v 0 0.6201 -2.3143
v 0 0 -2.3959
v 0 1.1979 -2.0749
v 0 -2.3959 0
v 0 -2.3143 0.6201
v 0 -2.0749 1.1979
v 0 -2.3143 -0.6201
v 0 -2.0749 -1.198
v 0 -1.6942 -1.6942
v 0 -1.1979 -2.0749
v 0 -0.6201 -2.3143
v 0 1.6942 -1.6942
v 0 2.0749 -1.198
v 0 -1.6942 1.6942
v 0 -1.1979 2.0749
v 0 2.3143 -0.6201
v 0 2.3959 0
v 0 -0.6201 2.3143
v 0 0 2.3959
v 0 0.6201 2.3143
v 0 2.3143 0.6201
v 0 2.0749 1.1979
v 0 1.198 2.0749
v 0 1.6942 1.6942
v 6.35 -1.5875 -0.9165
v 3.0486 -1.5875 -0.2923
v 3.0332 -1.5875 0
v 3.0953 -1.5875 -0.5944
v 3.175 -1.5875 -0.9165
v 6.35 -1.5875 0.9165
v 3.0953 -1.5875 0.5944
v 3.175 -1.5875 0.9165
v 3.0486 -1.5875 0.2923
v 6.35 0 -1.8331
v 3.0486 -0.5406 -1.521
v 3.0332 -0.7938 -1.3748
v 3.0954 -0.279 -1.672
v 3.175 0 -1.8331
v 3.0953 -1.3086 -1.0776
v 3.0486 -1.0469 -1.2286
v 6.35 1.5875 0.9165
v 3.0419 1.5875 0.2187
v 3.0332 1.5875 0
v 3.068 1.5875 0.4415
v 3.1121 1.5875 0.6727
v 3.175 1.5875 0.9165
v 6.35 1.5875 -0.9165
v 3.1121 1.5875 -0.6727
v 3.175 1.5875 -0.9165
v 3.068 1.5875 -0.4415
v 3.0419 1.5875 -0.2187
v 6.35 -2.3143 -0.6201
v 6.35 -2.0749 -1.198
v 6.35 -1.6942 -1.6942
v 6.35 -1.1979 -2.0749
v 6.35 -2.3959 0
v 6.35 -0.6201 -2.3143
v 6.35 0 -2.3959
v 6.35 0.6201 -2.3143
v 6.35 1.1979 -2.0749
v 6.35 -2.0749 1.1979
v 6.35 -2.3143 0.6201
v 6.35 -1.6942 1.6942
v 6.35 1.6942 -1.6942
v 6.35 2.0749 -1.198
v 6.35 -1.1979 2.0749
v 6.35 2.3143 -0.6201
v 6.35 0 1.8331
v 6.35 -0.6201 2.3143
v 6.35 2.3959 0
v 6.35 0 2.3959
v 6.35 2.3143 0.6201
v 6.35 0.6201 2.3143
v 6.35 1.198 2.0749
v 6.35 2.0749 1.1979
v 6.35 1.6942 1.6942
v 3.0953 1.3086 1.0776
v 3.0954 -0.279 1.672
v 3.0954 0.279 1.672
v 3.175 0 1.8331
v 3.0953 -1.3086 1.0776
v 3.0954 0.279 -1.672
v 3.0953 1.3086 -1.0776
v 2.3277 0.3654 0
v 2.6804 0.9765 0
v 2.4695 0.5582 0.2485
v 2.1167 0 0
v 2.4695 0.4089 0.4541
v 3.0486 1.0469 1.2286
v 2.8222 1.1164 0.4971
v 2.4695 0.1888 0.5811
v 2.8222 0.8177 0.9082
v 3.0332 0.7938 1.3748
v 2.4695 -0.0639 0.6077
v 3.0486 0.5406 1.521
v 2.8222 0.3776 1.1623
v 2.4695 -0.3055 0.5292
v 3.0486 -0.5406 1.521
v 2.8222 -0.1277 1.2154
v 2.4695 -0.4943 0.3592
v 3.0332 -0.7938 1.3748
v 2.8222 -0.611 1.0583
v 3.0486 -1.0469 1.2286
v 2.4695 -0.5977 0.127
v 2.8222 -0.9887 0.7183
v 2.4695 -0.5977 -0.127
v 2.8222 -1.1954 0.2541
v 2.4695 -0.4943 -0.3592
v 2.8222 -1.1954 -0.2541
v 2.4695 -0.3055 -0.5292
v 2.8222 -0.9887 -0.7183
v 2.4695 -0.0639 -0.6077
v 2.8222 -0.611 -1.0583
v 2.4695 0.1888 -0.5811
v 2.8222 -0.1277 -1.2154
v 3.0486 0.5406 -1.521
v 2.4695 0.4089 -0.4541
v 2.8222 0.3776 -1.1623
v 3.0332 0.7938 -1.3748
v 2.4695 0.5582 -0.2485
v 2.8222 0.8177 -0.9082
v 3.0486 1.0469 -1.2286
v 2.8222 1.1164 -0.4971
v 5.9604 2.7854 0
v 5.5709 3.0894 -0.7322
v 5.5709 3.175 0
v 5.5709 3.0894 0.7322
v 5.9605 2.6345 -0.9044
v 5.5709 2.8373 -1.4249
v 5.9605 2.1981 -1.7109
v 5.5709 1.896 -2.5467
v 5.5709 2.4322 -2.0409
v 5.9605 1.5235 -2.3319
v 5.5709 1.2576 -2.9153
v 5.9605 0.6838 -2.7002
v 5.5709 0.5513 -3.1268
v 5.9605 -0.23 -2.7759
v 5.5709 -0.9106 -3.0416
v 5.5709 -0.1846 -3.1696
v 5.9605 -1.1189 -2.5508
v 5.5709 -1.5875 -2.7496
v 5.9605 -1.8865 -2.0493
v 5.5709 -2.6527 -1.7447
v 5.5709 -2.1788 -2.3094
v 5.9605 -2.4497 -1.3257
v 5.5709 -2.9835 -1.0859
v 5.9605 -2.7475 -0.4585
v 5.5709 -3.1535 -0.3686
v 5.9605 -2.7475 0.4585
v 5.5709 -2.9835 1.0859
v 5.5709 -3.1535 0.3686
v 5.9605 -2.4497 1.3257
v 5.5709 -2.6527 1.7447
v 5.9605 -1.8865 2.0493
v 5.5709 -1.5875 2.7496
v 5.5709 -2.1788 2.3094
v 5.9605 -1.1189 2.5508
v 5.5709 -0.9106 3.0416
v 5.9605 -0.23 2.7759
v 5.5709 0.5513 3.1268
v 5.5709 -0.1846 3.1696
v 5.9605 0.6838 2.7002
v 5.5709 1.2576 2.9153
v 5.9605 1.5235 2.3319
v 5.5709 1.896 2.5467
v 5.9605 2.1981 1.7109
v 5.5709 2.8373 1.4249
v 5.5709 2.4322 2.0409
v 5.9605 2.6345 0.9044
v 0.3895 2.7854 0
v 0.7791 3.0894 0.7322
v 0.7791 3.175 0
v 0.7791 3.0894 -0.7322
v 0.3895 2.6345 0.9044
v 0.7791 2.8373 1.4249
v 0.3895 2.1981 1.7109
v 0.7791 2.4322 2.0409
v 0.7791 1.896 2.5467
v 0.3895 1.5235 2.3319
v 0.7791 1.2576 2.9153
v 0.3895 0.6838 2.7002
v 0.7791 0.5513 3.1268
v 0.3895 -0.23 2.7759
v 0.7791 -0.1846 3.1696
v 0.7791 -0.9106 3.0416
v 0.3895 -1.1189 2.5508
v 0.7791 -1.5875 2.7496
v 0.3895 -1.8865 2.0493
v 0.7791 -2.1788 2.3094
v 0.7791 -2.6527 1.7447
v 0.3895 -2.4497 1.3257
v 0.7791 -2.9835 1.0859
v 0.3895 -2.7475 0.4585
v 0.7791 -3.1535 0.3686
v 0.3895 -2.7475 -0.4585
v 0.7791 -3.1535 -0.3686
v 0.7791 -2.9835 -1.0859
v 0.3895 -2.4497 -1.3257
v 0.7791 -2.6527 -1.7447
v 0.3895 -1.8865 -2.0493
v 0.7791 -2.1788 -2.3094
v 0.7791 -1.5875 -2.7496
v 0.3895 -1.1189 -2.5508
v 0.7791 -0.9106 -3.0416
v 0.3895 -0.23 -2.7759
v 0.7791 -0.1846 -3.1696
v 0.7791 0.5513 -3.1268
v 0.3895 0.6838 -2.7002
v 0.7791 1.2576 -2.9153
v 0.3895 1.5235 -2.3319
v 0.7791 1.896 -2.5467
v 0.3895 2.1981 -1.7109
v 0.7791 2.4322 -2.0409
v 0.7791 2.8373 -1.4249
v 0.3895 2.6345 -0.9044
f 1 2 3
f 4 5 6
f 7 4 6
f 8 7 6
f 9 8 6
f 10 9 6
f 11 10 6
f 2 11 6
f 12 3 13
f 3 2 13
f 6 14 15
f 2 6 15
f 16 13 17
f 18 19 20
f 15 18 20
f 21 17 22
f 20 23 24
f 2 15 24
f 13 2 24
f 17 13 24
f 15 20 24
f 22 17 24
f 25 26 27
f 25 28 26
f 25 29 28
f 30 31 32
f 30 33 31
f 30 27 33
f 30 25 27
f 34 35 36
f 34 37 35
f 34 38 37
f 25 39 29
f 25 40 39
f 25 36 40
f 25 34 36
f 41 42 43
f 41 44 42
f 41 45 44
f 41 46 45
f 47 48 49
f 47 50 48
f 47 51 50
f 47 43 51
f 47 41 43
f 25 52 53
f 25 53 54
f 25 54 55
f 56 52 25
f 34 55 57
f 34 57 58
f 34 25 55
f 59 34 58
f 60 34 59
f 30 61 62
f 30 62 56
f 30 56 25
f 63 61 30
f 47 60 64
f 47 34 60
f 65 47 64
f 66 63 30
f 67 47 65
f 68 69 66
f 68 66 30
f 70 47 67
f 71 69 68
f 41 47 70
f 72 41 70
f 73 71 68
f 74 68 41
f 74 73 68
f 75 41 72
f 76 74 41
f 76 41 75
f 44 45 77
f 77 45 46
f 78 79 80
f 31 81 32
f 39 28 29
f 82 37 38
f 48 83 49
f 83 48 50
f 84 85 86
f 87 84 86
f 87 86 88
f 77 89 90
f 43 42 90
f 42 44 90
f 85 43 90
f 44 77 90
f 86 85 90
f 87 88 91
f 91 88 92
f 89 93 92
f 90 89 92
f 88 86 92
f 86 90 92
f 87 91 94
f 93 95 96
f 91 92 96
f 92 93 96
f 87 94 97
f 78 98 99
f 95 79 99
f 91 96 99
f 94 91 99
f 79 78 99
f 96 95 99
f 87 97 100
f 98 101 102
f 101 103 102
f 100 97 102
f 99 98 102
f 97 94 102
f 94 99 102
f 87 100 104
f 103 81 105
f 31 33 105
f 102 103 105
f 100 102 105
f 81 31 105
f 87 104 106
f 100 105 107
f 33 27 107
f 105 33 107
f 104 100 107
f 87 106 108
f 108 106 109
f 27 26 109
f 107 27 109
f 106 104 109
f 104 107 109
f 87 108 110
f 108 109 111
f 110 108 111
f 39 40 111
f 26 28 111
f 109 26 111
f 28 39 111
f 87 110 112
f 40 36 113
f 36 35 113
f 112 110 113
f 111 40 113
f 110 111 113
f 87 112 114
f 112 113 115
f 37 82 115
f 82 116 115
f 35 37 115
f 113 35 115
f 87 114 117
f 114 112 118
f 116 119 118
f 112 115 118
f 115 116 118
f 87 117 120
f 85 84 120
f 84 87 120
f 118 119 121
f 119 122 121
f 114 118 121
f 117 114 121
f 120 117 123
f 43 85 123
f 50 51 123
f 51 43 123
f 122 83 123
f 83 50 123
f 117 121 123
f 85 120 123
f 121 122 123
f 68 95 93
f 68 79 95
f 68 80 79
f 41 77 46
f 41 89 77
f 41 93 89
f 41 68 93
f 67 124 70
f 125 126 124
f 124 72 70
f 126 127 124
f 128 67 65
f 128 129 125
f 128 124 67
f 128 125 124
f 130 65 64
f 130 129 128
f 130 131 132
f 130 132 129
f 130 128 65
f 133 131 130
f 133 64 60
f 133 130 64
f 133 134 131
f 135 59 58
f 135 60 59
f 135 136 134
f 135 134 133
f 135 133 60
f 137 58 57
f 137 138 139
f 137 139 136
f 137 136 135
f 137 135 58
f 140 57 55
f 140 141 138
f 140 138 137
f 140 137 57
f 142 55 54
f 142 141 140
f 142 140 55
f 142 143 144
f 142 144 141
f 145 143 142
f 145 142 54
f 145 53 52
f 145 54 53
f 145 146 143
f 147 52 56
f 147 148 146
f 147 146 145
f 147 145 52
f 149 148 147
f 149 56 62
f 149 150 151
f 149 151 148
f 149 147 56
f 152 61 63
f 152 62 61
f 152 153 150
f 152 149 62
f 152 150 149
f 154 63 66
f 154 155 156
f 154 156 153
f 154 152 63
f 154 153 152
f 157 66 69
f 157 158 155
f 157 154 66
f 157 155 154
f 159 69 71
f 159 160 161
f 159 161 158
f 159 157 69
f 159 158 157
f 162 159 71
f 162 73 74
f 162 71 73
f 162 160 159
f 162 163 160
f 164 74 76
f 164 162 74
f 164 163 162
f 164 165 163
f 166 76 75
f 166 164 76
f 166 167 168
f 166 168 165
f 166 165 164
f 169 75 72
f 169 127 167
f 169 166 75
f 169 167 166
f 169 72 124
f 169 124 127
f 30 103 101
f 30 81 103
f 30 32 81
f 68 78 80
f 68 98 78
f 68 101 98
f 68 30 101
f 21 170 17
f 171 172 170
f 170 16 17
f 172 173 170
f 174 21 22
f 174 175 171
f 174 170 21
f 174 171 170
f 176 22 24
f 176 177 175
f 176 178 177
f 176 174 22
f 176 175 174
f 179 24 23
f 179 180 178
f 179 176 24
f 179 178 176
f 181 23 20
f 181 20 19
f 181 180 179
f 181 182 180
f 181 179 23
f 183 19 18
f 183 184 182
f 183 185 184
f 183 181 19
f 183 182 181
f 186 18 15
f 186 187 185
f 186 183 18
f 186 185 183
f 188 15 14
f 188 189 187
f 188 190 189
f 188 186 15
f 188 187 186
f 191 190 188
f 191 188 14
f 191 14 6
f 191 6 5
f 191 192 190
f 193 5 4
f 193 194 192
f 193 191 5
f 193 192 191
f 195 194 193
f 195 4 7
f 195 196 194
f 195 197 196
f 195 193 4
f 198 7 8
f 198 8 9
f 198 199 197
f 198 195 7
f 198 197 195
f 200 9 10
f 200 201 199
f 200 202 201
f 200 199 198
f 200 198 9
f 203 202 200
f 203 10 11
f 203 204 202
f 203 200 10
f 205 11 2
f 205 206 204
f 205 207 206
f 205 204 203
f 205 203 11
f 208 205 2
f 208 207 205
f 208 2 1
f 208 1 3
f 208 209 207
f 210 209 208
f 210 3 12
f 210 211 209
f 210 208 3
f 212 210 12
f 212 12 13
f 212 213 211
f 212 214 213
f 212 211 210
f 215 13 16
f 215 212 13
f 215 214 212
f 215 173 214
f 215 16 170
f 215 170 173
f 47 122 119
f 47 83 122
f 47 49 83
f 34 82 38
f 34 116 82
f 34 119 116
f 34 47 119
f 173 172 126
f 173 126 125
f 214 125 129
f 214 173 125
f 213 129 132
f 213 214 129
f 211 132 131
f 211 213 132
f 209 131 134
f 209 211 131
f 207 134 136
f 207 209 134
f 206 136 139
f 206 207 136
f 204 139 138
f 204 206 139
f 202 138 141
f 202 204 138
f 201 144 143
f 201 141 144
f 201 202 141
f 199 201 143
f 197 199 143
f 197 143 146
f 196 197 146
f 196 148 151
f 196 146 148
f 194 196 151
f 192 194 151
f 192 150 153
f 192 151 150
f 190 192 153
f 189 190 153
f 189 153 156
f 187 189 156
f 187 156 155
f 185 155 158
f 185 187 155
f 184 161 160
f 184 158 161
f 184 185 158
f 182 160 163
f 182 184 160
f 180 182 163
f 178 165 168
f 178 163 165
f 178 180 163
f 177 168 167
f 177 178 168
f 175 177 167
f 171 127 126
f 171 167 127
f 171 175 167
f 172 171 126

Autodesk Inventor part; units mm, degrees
ref_plane "YZ Plane" through (0, 0, 0) normal (1, 0, 0) x (0, 1, 0)
ref_plane "XZ Plane" through (0, 0, 0) normal (0, 1, 0) x (-1, 0, 0)
sketch "Sketch1" plane through (0, 0, 0) normal (0, 0, 1) x (1, 0, 0)
  line L0 (0, 0) -> (2.1167, 0)
  line L1 (6.35, 1.8331) -> (6.35, 3.175)
  line L2 (6.35, 3.175) -> (0, 3.175)
  line L3 (6.35, 1.8331) -> (3.175, 1.8331)
  line L4 (3.175, 1.8331) -> (2.1167, 0)
  line L5 (0, -0.635) -> (0, 3.81) projected
  line L6 (0, 3.175) -> (0, 0)
  dimension "d0" = 3.175
  dimension "d1" = 60
  dimension "d2" = 6.35
  dimension "d3" = 3.6662
  dimension "d5" = 6.35
revolve "Body" add sketch "Sketch1" angle 360 about axis through (0, 0, 0) along (1, 0, 0)
chamfer "Chamfer1" distance 0.7791 angle 45 1 edges at (6.35, -3.175, 0) measured on face at (6.35, 2.6792, -0.3995)
sketch "Sketch2" plane through (6.35, 0, 0) normal (1, 0, 0) x (0, 0, -1)
  circle A0 centre (0, 0) radius 1.8331 projected
  line L0 (-0.9165, 1.5875) -> (0.9165, 1.5875)
  line L1 (0.9165, 1.5875) -> (1.8331, 0)
  line L2 (1.8331, 0) -> (0.9165, -1.5875)
  line L3 (0.9165, -1.5875) -> (-0.9165, -1.5875)
  line L4 (-0.9165, -1.5875) -> (-1.8331, 0)
  line L5 (-1.8331, 0) -> (-0.9165, 1.5875)
extrude "Slot" add sketch "Sketch2" against normal up to next contours L1 A0 | A0 L2 | L0 A0 | A0 L3 | L5 A0 | A0 L4
thread "Thread" size "1/4-20 UNC" class "2A" standard "ANSI Unified Screw Threads" length 6.35
chamfer "Chamfer2" distance 0.7791 angle 45 1 edges at (0, -3.175, 0) measured on face at (3.714, 3.1339, -0.5093)
ref_plane "Work Plane1" through (3.175, 0, 0) normal (0, 0.5, 0.866) x (1, 0, 0)
equation "\"d0\" = INTI"
equation "\"d2\" = NND"
equation "\"d3\" = 1.1547 * SW"
equation "\"d5\" = NLG"
equation "\"d7\" = -0.5 * GD1 + 0.5 * NND"
equation "\"d8\" = FAWI"
equation "\"d29\" = -0.5 * GD1 + 0.5 * NND"
equation "\"d11\" = NLG"
equation "\"d13\" = -0.5 * GD1 + 0.5 * NND"
equation "\"d14\" = FAWI"
equation "\"d30\" = -0.5 * GD1 + 0.5 * NND"
equation "\"NND\" = 6.35"
equation "\"NLG\" = 6.35"
equation "\"INTI\" = 3.175"
equation "\"FAWI\" = 45deg"
equation "\"SW\" = 3.175"
equation "\"GD1\" = 4.79188"
equation "\"FAWI1\" = 44.999991deg"
equation "\"SPD\" = 3.3528"
equation "\"SEWI\" = 90deg"
equation "\"TOA\" = 30deg"
equation "\"ZLG\" = 1.7018"
equation "\"ZD\" = 3.9624"
equation "\"HHPTC\" = 1.27"
equation "\"THREADDIA\" = 6.35"
equation "\"OPR\" = 4.7752"
equation "\"E0\" = 1.155 * SW"
properties part number "ANSI B18.3 - 1/4-20 UNC x 0.25" material "Steel, Alloy"
